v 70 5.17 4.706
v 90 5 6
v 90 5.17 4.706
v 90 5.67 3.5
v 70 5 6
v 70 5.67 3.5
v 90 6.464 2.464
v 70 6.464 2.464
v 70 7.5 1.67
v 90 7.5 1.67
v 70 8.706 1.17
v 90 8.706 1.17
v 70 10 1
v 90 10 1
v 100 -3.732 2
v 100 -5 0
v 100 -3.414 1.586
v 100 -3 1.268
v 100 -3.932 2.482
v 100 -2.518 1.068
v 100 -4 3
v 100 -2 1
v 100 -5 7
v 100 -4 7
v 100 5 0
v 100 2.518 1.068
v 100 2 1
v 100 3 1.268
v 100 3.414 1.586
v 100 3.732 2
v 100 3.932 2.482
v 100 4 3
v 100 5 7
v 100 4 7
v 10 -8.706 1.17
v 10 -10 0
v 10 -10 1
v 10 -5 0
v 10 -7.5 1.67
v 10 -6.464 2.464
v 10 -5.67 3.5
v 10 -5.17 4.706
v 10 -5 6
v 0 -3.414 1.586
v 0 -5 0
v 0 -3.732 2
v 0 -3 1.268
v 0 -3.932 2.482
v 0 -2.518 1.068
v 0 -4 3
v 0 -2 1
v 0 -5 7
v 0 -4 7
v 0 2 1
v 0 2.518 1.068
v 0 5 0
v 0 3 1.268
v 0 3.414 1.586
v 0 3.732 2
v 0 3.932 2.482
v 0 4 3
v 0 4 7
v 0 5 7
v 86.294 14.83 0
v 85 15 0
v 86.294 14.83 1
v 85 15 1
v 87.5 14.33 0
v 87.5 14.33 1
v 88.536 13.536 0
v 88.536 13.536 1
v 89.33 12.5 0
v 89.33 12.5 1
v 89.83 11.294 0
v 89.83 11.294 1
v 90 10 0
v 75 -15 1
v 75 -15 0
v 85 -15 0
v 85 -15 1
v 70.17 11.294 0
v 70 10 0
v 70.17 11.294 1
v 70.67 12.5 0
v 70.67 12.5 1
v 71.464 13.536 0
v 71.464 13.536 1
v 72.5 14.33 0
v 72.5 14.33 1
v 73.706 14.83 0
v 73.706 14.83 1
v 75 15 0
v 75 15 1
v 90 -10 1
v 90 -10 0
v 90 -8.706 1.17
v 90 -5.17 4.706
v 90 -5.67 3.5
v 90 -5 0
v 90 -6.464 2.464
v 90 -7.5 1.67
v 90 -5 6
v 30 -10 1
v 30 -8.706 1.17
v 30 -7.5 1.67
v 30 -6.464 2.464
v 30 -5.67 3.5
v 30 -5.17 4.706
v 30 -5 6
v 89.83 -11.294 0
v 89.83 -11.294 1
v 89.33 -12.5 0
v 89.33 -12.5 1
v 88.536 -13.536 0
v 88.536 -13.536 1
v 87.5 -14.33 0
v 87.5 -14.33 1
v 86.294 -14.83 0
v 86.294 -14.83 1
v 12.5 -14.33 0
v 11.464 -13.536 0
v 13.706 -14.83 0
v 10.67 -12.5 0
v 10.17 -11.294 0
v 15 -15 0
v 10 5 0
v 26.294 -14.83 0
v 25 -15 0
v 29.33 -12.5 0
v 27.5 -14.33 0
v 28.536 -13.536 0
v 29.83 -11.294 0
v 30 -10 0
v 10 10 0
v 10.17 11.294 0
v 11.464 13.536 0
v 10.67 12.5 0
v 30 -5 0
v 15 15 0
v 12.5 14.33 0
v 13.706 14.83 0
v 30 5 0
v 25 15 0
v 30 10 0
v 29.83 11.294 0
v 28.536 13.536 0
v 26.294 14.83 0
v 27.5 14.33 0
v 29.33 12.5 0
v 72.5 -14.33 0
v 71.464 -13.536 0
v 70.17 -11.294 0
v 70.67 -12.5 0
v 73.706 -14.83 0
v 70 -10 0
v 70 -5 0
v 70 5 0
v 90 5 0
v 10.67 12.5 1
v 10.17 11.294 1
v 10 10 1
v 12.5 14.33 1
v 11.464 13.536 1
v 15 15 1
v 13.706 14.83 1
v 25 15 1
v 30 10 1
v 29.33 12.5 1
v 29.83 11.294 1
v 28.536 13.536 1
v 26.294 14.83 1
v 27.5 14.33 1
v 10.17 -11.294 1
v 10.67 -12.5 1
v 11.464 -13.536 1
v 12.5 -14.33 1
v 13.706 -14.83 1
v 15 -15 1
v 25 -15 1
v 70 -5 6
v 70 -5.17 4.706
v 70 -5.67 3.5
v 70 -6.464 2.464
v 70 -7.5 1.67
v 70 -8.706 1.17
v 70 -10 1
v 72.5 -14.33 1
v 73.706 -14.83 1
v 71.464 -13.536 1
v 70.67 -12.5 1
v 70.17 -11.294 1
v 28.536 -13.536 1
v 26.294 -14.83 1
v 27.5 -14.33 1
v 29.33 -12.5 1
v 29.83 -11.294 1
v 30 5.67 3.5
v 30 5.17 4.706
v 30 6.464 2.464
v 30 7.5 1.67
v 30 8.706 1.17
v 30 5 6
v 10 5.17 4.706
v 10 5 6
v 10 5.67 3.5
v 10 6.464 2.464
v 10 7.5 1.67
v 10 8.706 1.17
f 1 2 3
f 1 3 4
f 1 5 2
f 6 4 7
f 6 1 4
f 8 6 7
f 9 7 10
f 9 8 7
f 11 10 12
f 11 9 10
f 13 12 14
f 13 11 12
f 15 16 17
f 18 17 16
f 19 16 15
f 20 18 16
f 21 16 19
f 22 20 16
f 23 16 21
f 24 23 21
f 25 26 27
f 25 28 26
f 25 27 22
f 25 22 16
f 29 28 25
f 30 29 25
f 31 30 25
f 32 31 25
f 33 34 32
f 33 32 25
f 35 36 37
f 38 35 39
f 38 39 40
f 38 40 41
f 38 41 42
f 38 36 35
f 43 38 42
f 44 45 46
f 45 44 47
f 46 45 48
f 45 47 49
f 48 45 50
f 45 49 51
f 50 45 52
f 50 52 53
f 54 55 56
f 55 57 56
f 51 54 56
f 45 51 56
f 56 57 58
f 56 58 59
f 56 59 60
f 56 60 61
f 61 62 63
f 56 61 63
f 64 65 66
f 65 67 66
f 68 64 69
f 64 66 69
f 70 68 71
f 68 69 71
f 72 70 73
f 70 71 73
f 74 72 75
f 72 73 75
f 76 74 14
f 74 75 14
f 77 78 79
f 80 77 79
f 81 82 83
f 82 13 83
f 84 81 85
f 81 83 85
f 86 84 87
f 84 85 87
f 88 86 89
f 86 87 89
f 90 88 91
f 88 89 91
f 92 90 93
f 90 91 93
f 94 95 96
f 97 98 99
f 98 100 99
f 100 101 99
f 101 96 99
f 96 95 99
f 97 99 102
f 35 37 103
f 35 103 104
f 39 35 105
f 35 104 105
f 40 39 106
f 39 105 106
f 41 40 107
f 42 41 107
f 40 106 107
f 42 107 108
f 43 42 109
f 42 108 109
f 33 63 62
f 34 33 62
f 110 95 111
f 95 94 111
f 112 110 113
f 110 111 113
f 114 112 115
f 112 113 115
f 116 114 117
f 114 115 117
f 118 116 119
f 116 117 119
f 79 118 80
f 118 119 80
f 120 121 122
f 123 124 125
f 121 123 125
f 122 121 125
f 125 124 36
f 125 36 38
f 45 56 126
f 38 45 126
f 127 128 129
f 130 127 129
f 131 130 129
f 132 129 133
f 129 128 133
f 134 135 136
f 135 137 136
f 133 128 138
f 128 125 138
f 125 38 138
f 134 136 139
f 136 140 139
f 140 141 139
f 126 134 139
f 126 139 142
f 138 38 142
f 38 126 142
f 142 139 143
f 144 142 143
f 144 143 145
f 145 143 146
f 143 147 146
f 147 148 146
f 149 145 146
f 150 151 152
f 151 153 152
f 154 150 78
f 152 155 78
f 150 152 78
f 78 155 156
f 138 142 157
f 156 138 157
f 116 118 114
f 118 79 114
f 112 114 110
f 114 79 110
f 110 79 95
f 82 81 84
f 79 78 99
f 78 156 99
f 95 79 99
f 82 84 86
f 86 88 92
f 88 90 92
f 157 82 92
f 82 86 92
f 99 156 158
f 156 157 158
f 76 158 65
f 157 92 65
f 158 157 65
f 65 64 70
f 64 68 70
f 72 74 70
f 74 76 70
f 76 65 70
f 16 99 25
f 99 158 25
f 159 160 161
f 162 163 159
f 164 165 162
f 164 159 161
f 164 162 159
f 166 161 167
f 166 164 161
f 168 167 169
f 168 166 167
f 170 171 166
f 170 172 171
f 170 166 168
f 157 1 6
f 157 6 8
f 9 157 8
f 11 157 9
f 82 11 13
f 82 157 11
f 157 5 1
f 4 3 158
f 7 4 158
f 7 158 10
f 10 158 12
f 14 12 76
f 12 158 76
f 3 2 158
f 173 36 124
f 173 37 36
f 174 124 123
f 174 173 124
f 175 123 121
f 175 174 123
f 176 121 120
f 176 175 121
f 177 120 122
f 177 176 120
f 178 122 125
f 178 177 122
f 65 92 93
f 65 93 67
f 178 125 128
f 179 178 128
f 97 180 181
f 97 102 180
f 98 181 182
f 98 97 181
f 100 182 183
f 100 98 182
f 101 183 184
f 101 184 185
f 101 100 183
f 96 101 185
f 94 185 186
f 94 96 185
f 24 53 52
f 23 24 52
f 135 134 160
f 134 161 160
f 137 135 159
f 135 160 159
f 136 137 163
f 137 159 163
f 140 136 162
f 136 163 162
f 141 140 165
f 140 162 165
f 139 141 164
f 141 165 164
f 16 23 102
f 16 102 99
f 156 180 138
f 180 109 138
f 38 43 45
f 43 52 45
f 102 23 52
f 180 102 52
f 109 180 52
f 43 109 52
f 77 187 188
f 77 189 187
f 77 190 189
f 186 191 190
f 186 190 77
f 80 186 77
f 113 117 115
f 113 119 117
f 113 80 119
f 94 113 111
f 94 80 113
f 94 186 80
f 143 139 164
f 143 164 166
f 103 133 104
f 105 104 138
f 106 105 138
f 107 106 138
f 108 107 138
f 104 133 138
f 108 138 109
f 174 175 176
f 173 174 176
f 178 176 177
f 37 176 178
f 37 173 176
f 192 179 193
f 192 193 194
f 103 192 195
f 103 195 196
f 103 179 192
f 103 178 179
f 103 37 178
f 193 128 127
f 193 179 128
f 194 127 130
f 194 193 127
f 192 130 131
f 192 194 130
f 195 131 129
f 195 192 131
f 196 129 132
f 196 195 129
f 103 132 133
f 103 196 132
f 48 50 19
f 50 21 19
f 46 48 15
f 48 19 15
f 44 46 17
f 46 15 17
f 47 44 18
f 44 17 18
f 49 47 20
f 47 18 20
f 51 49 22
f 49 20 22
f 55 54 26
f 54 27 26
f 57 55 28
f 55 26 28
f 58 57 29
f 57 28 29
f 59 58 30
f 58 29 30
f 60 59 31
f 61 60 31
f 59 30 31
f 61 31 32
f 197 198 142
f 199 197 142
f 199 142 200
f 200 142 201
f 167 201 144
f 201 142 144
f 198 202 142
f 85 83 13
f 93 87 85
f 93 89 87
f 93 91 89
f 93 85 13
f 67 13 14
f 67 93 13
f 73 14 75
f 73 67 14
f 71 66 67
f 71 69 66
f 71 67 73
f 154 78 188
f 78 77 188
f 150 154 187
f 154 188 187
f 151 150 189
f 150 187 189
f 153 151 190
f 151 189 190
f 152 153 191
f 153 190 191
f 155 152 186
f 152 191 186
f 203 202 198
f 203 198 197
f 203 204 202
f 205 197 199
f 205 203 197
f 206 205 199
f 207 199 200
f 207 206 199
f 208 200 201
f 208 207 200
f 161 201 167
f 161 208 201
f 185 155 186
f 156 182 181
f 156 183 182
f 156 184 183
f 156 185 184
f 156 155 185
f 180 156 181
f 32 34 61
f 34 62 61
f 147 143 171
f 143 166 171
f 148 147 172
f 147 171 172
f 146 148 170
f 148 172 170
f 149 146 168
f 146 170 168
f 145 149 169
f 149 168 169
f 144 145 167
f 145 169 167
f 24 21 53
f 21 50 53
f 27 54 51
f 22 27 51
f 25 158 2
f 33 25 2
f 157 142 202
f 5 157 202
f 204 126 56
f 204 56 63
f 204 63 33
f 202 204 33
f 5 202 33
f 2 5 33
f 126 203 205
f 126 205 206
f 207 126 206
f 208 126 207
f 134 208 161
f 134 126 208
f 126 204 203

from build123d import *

# Parameters (mm, degrees)
F1_DEPTH = 100
F2_W     = 20
F2_H     = 30
F3_DEPTH = 1
F4_R     = 4.99999
F5_R     = 2


# Not quite as in the source:
# - a fillet or chamfer is up to 0.001 mm smaller than in the source, because OpenCascade refuses the exact size


with BuildPart() as f1:
    # F0 (on Right) → F1 (new body)
    with BuildSketch(Plane.YZ):
        Polygon((-4, 7), (-5, 7), (-5, 0), (5, 0), (5, 7), (4, 7), (4, 1), (-4, 1), align=None)
    extrude(amount=F1_DEPTH)

    # F2 (on Top) → F3 (join)
    with BuildSketch(Plane.XY):
        with Locations((20, 0)):
            Rectangle(F2_W, F2_H)
        with Locations((80, 0)):
            Rectangle(F2_W, F2_H)
    extrude(amount=F3_DEPTH)

    # F4 (radius 5 in the source; OpenCascade refuses exactly that, so slightly less here)
    f4_edges = [f1.edges().sort_by_distance(p)[0] for p in [
        (20, -5, 1),
        (80, -5, 1),
        (20, 5, 1),
        (80, 5, 1),
        (10, -15, 0.5),
        (30, -15, 0.5),
        (70, -15, 0.5),
        (90, -15, 0.5),
        (10, 15, 0.5),
        (30, 15, 0.5),
        (70, 15, 0.5),
        (90, 15, 0.5),
    ]]
    fillet(f4_edges, radius=F4_R)

    # F5
    f5_edges = [f1.edges().sort_by_distance(p)[0] for p in [
        (50, 4, 1),
        (50, -4, 1),
    ]]
    fillet(f5_edges, radius=F5_R)


solid = f1.part
